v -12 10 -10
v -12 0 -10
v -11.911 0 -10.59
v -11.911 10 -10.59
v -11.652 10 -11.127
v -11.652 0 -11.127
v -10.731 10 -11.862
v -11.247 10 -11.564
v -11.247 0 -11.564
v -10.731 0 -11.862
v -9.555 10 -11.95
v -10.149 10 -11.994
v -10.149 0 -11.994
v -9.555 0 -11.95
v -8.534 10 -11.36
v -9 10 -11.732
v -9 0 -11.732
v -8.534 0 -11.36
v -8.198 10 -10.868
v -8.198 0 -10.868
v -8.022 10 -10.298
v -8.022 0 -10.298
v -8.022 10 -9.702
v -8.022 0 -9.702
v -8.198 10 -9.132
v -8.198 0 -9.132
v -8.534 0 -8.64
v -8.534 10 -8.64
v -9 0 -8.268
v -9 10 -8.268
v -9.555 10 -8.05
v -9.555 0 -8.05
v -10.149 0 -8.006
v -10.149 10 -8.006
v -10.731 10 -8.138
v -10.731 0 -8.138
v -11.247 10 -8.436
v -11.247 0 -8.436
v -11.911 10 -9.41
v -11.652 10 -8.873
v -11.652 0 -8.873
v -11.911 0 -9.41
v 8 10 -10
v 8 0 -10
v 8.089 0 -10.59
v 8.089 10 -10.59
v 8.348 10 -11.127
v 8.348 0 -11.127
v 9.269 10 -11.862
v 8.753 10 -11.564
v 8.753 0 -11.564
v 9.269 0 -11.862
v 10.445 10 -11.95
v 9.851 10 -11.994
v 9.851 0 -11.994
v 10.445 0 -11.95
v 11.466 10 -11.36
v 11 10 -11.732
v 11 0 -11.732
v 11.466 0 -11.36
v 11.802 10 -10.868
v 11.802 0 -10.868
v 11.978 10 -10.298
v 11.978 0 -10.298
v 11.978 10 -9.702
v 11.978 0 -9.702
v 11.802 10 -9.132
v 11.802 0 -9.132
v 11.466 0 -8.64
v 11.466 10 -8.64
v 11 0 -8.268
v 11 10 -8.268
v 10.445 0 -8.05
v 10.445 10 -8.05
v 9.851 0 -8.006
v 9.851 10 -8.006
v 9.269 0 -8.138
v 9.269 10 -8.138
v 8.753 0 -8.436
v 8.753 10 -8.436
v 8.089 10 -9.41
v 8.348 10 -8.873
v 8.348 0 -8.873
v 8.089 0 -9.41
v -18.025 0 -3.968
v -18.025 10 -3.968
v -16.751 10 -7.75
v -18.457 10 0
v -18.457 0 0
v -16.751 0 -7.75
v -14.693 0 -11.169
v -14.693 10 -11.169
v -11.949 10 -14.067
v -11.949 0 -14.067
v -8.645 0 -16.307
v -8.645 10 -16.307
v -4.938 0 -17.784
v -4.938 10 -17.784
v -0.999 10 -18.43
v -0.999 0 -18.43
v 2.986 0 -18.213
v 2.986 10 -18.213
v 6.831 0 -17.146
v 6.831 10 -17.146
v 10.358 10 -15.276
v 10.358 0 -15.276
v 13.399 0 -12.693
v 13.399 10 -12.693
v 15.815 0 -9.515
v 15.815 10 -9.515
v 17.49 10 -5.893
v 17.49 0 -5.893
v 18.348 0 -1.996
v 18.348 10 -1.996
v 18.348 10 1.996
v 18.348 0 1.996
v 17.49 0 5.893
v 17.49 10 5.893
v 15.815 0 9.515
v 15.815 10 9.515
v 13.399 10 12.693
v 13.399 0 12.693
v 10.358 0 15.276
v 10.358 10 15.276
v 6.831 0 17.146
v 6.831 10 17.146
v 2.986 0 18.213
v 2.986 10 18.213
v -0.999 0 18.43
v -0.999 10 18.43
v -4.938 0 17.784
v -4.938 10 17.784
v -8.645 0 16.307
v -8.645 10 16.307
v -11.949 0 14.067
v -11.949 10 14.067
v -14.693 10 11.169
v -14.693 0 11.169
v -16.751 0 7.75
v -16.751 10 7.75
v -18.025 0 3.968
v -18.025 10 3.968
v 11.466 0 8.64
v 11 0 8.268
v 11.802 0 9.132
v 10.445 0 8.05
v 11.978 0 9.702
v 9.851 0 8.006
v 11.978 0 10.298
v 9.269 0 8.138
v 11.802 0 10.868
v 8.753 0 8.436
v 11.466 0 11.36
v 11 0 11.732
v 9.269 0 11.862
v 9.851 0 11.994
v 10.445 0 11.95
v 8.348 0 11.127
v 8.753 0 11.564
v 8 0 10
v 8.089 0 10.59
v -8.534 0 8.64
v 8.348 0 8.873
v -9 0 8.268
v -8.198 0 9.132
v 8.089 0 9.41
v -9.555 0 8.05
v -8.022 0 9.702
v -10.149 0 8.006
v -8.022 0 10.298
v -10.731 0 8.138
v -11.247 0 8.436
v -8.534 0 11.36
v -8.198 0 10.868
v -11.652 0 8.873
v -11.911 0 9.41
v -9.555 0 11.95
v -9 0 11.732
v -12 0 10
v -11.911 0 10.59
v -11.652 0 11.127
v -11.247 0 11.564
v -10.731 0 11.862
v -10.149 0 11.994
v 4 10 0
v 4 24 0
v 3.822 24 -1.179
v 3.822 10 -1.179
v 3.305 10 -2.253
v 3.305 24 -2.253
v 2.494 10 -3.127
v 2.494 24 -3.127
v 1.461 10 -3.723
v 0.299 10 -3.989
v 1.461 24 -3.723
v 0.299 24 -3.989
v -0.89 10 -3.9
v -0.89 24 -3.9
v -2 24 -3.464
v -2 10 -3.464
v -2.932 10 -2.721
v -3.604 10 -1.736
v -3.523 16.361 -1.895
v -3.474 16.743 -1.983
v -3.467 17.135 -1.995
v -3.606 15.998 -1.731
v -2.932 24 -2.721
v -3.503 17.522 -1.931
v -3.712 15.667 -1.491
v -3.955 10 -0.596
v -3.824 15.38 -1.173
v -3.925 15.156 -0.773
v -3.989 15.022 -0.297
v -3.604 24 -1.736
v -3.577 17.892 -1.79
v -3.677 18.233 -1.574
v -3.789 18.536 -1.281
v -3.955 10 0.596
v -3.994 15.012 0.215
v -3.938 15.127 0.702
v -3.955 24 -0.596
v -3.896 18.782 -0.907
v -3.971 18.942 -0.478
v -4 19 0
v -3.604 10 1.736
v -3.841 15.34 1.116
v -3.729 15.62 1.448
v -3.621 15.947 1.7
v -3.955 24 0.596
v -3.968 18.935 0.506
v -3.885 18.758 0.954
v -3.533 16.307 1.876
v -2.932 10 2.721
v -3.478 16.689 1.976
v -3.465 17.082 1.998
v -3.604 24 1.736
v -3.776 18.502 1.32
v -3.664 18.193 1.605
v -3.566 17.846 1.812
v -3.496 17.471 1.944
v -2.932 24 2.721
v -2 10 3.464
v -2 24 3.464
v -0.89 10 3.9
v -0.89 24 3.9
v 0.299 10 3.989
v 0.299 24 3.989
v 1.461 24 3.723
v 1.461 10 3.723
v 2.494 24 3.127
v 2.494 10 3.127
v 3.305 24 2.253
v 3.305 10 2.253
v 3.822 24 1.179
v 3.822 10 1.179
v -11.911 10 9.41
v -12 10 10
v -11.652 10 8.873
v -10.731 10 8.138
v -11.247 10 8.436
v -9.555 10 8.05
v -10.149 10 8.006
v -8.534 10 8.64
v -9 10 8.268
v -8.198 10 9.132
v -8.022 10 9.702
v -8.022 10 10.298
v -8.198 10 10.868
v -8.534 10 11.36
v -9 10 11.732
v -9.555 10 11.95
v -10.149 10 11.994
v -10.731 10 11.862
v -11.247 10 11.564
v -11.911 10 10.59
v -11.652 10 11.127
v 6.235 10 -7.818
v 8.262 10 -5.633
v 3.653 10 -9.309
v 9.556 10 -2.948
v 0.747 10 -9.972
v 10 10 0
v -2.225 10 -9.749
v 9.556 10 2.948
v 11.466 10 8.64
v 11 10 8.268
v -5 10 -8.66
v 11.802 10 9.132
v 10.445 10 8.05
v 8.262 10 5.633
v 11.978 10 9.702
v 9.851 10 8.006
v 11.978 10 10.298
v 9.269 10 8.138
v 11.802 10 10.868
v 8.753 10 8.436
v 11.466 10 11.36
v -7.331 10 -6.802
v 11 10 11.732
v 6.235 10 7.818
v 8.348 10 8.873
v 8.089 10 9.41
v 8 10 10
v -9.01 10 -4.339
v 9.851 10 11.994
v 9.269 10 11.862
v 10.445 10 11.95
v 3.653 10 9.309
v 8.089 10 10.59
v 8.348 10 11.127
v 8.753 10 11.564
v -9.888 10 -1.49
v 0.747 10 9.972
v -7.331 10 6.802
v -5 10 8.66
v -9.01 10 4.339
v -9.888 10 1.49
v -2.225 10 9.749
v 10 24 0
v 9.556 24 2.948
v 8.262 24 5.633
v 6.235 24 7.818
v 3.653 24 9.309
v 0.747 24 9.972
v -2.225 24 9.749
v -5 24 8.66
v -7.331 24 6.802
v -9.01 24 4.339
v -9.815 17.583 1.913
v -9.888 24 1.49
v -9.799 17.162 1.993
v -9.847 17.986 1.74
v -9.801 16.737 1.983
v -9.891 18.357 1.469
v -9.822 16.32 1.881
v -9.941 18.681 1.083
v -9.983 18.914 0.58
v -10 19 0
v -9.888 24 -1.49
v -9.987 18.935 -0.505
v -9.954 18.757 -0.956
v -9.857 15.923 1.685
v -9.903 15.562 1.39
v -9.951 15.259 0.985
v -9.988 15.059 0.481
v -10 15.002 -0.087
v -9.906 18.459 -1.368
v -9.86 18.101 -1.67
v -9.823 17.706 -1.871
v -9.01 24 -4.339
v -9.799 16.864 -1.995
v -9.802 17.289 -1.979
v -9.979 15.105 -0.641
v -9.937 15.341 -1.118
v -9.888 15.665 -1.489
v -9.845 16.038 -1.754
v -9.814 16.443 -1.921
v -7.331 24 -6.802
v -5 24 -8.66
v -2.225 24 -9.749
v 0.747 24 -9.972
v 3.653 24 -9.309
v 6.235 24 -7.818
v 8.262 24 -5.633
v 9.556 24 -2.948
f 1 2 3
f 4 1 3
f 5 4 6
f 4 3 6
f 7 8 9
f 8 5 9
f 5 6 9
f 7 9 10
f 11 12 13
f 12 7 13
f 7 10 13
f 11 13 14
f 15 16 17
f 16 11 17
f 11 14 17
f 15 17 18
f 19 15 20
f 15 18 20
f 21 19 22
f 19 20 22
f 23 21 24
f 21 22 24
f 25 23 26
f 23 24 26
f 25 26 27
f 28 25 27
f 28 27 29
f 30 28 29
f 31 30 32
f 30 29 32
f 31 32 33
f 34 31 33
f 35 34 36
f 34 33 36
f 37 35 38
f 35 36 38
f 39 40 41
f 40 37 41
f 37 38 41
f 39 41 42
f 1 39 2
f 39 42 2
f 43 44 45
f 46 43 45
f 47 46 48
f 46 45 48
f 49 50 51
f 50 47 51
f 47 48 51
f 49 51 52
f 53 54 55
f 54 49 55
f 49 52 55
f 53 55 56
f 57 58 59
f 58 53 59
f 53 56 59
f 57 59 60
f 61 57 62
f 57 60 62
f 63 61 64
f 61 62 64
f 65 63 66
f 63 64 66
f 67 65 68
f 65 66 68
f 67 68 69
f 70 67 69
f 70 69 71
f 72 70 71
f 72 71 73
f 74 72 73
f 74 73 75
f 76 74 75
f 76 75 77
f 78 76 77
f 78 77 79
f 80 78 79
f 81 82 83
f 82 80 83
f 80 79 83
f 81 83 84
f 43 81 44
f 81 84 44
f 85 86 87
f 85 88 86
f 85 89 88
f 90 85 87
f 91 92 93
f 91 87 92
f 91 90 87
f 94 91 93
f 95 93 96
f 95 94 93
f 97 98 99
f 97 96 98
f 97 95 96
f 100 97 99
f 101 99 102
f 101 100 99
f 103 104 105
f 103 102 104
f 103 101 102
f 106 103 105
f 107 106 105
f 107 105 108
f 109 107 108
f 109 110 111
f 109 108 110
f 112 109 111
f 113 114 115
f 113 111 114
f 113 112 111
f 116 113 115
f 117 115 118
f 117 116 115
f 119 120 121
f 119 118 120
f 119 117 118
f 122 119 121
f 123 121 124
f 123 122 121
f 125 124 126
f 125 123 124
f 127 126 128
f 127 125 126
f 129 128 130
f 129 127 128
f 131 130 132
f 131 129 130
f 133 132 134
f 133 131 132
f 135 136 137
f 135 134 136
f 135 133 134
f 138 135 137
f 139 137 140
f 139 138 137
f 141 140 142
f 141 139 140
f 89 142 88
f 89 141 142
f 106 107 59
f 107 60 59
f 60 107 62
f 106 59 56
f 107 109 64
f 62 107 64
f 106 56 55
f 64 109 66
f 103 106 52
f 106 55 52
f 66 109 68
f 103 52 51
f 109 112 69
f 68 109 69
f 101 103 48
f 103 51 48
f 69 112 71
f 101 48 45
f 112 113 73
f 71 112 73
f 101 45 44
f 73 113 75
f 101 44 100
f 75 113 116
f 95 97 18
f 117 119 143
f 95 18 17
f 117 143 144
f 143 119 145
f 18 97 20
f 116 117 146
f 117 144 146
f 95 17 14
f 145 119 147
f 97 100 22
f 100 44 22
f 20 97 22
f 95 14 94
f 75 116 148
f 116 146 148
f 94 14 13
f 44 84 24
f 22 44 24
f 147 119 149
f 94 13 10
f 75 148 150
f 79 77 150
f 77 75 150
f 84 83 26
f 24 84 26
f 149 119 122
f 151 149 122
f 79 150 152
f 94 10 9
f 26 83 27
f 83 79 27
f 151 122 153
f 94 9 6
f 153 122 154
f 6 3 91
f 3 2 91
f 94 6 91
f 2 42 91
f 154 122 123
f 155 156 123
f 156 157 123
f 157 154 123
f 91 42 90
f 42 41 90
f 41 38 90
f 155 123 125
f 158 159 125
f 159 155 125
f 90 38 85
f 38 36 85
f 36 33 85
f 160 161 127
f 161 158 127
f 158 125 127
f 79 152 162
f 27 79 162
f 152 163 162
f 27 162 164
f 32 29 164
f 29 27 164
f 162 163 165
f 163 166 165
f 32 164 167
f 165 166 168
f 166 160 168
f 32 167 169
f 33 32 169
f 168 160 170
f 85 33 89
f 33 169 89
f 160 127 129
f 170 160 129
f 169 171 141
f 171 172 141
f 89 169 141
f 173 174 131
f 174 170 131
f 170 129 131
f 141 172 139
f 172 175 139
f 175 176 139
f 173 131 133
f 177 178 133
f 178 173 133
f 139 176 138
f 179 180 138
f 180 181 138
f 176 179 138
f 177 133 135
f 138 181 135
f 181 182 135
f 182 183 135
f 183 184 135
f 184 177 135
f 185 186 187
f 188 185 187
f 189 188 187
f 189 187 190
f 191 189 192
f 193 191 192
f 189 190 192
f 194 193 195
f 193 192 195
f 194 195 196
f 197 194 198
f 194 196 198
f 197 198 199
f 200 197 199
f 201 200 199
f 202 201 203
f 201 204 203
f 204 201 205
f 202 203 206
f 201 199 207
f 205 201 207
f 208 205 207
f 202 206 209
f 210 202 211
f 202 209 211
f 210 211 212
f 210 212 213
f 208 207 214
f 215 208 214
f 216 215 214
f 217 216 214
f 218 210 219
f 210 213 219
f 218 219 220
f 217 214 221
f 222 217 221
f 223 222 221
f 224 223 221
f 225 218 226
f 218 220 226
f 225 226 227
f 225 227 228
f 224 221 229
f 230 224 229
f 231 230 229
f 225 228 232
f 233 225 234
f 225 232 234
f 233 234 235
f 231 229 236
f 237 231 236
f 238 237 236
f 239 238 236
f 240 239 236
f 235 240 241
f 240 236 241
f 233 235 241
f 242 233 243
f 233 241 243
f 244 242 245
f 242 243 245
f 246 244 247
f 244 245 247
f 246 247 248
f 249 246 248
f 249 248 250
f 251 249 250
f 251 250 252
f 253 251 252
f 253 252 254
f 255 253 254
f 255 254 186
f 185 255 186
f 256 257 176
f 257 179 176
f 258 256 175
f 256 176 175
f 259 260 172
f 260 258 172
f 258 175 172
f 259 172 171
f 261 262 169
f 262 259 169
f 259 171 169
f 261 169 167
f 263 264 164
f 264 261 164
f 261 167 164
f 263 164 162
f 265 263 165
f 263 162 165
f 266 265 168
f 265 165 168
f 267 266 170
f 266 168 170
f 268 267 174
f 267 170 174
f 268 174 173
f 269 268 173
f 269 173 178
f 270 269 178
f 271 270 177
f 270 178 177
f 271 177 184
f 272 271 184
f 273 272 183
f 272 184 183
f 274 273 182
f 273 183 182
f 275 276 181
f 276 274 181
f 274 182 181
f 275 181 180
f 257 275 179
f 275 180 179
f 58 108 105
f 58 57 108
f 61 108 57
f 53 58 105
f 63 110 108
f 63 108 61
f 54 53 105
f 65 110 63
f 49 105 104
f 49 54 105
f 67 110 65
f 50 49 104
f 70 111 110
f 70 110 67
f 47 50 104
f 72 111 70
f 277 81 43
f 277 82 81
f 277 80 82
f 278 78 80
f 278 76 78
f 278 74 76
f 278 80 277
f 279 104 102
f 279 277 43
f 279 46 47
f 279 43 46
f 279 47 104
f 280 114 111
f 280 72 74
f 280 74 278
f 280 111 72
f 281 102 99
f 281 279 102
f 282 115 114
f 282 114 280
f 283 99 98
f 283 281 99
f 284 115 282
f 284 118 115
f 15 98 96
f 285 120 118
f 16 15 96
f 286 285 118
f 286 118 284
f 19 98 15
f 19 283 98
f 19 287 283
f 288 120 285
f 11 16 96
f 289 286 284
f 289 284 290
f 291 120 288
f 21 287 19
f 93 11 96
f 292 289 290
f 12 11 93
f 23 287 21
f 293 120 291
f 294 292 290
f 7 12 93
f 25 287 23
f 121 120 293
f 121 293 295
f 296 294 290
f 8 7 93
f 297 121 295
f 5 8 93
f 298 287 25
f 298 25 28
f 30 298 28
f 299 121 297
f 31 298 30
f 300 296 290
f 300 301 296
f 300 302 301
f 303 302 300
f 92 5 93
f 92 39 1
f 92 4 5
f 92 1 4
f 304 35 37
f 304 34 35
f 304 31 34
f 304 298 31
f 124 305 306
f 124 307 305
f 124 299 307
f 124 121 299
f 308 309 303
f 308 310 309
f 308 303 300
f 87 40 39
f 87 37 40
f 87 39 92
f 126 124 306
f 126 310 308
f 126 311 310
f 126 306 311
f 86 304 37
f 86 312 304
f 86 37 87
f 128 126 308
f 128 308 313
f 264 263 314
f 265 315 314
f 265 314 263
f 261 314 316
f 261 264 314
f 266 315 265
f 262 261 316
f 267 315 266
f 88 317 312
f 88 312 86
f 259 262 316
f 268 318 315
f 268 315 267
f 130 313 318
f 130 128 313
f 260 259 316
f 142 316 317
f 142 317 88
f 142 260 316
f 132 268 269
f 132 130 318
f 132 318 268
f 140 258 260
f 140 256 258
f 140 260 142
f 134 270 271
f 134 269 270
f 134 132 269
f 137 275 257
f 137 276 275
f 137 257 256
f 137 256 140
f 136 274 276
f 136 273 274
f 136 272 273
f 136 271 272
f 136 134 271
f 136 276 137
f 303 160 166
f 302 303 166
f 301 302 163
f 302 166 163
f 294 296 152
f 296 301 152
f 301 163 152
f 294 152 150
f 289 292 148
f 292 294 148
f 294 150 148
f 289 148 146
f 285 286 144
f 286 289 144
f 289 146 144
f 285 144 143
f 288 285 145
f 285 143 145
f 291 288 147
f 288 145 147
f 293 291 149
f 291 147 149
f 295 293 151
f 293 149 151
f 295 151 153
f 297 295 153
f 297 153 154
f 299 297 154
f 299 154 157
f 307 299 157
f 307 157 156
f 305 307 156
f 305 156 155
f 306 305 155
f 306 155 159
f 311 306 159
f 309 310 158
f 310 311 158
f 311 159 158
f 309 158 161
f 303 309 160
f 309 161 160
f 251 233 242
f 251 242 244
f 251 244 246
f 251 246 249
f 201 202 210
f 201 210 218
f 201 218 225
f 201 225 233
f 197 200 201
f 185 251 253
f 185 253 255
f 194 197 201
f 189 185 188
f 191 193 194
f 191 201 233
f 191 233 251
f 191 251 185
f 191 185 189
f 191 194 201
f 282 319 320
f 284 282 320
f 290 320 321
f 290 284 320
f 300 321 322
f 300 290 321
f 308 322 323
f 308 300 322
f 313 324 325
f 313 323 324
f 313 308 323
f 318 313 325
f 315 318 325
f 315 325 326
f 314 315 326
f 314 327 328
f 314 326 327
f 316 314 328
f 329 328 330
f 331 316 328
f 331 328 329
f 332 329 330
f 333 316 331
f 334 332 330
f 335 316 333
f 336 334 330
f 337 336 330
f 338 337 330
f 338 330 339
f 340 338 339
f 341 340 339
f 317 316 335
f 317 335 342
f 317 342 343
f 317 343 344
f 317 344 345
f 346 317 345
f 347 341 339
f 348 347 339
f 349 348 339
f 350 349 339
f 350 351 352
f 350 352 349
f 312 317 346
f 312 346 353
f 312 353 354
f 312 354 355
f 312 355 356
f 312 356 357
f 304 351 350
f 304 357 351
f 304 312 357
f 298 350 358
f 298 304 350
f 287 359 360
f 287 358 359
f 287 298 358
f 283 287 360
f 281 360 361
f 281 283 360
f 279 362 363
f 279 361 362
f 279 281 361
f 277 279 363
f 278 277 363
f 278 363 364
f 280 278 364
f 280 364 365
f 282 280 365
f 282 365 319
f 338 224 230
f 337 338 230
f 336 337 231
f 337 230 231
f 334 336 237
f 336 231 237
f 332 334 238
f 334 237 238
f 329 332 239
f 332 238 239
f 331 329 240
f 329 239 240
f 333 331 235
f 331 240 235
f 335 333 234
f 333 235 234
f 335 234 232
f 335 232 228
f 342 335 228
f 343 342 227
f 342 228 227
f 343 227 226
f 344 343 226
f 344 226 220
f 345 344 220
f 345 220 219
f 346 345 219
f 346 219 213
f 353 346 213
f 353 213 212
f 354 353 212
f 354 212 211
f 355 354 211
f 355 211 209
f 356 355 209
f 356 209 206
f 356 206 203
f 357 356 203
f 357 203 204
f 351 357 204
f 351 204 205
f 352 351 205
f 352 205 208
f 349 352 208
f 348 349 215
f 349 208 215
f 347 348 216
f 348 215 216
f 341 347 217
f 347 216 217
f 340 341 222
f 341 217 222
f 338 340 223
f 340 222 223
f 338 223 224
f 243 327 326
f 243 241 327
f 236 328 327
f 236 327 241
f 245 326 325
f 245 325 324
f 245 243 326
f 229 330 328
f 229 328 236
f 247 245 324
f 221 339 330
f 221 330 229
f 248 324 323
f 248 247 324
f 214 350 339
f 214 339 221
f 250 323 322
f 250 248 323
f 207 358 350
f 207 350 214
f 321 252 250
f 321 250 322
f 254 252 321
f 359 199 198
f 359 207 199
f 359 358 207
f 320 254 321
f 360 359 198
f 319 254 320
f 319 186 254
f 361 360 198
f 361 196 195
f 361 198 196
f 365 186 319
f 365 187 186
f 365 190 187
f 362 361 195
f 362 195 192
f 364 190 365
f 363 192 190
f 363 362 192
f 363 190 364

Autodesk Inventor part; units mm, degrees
ref_plane "YZ Plane" through (0, 0, 0) normal (1, 0, 0) x (0, 1, 0)
ref_plane "XZ Plane" through (0, 0, 0) normal (0, 1, 0) x (-1, 0, 0)
ref_plane "XY Plane" through (0, 0, 0) normal (0, 0, 1) x (1, 0, 0)
sketch "Sketch1" plane through (0, 0, 0) normal (0, 1, 0) x (-1, 0, 0)
  circle A0 centre (0, 0) radius 18.4566
  circle A1 centre (10, 10) radius 2
  circle A2 centre (10, -10) radius 2
  circle A3 centre (-10, -10) radius 2
  circle A4 centre (-10, 10) radius 2
  point P0 (8.8496, 0)
extrude "Extrusion1" add sketch "Sketch1" along normal blind 10
sketch "Sketch2" plane through (0, 10, 0) normal (0, 1, 0) x (1, 0, 0)
  circle A0 centre (0, 0) radius 10
  dimension "d2" = 20
extrude "Extrusion2" add sketch "Sketch2" along normal blind 14
sketch "Sketch3" plane through (0, 24, 0) normal (0, 1, 0) x (1, 0, 0)
  circle A0 centre (0, 0) radius 4
  dimension "d5" = 8
extrude "Extrusion3" cut sketch "Sketch3" against normal blind 14
sketch "Sketch4" plane through (0, 0, 0) normal (1, 0, 0) x (0, 1, 0)
  line L0 (24, -10) -> (24, 10) projected
  line L1 (24, 0) -> (17, 0)
  circle A0 centre (17, 0) radius 2
  point P0 (0, 0)
  dimension "d8" = 7
  dimension "d9" = 4
extrude "Extrusion4" cut sketch "Sketch4" against normal blind 14
sketch "Sketch5" plane through (0, 10, 0) normal (0, 1, 0) x (1, 0, 0)
  circle A0 centre (0, 0) radius 10 projected
  circle A1 centre (0, 0) radius 18.4566 projected
  circle A2 centre (10, -10) radius 2 projected
  circle A3 centre (10, 10) radius 2 projected
  circle A4 centre (-10, 10) radius 2 projected
  circle A5 centre (-10, -10) radius 2 projected
  circle A6 centre (-10, -10) radius 2 projected
  circle A7 centre (-10, -10) radius 4.1421
  circle A8 centre (0, 0) radius 10 projected
  circle A9 centre (-10, 10) radius 2 projected
  circle A10 centre (-10, 10) radius 4.1421
properties part number "perilla"
